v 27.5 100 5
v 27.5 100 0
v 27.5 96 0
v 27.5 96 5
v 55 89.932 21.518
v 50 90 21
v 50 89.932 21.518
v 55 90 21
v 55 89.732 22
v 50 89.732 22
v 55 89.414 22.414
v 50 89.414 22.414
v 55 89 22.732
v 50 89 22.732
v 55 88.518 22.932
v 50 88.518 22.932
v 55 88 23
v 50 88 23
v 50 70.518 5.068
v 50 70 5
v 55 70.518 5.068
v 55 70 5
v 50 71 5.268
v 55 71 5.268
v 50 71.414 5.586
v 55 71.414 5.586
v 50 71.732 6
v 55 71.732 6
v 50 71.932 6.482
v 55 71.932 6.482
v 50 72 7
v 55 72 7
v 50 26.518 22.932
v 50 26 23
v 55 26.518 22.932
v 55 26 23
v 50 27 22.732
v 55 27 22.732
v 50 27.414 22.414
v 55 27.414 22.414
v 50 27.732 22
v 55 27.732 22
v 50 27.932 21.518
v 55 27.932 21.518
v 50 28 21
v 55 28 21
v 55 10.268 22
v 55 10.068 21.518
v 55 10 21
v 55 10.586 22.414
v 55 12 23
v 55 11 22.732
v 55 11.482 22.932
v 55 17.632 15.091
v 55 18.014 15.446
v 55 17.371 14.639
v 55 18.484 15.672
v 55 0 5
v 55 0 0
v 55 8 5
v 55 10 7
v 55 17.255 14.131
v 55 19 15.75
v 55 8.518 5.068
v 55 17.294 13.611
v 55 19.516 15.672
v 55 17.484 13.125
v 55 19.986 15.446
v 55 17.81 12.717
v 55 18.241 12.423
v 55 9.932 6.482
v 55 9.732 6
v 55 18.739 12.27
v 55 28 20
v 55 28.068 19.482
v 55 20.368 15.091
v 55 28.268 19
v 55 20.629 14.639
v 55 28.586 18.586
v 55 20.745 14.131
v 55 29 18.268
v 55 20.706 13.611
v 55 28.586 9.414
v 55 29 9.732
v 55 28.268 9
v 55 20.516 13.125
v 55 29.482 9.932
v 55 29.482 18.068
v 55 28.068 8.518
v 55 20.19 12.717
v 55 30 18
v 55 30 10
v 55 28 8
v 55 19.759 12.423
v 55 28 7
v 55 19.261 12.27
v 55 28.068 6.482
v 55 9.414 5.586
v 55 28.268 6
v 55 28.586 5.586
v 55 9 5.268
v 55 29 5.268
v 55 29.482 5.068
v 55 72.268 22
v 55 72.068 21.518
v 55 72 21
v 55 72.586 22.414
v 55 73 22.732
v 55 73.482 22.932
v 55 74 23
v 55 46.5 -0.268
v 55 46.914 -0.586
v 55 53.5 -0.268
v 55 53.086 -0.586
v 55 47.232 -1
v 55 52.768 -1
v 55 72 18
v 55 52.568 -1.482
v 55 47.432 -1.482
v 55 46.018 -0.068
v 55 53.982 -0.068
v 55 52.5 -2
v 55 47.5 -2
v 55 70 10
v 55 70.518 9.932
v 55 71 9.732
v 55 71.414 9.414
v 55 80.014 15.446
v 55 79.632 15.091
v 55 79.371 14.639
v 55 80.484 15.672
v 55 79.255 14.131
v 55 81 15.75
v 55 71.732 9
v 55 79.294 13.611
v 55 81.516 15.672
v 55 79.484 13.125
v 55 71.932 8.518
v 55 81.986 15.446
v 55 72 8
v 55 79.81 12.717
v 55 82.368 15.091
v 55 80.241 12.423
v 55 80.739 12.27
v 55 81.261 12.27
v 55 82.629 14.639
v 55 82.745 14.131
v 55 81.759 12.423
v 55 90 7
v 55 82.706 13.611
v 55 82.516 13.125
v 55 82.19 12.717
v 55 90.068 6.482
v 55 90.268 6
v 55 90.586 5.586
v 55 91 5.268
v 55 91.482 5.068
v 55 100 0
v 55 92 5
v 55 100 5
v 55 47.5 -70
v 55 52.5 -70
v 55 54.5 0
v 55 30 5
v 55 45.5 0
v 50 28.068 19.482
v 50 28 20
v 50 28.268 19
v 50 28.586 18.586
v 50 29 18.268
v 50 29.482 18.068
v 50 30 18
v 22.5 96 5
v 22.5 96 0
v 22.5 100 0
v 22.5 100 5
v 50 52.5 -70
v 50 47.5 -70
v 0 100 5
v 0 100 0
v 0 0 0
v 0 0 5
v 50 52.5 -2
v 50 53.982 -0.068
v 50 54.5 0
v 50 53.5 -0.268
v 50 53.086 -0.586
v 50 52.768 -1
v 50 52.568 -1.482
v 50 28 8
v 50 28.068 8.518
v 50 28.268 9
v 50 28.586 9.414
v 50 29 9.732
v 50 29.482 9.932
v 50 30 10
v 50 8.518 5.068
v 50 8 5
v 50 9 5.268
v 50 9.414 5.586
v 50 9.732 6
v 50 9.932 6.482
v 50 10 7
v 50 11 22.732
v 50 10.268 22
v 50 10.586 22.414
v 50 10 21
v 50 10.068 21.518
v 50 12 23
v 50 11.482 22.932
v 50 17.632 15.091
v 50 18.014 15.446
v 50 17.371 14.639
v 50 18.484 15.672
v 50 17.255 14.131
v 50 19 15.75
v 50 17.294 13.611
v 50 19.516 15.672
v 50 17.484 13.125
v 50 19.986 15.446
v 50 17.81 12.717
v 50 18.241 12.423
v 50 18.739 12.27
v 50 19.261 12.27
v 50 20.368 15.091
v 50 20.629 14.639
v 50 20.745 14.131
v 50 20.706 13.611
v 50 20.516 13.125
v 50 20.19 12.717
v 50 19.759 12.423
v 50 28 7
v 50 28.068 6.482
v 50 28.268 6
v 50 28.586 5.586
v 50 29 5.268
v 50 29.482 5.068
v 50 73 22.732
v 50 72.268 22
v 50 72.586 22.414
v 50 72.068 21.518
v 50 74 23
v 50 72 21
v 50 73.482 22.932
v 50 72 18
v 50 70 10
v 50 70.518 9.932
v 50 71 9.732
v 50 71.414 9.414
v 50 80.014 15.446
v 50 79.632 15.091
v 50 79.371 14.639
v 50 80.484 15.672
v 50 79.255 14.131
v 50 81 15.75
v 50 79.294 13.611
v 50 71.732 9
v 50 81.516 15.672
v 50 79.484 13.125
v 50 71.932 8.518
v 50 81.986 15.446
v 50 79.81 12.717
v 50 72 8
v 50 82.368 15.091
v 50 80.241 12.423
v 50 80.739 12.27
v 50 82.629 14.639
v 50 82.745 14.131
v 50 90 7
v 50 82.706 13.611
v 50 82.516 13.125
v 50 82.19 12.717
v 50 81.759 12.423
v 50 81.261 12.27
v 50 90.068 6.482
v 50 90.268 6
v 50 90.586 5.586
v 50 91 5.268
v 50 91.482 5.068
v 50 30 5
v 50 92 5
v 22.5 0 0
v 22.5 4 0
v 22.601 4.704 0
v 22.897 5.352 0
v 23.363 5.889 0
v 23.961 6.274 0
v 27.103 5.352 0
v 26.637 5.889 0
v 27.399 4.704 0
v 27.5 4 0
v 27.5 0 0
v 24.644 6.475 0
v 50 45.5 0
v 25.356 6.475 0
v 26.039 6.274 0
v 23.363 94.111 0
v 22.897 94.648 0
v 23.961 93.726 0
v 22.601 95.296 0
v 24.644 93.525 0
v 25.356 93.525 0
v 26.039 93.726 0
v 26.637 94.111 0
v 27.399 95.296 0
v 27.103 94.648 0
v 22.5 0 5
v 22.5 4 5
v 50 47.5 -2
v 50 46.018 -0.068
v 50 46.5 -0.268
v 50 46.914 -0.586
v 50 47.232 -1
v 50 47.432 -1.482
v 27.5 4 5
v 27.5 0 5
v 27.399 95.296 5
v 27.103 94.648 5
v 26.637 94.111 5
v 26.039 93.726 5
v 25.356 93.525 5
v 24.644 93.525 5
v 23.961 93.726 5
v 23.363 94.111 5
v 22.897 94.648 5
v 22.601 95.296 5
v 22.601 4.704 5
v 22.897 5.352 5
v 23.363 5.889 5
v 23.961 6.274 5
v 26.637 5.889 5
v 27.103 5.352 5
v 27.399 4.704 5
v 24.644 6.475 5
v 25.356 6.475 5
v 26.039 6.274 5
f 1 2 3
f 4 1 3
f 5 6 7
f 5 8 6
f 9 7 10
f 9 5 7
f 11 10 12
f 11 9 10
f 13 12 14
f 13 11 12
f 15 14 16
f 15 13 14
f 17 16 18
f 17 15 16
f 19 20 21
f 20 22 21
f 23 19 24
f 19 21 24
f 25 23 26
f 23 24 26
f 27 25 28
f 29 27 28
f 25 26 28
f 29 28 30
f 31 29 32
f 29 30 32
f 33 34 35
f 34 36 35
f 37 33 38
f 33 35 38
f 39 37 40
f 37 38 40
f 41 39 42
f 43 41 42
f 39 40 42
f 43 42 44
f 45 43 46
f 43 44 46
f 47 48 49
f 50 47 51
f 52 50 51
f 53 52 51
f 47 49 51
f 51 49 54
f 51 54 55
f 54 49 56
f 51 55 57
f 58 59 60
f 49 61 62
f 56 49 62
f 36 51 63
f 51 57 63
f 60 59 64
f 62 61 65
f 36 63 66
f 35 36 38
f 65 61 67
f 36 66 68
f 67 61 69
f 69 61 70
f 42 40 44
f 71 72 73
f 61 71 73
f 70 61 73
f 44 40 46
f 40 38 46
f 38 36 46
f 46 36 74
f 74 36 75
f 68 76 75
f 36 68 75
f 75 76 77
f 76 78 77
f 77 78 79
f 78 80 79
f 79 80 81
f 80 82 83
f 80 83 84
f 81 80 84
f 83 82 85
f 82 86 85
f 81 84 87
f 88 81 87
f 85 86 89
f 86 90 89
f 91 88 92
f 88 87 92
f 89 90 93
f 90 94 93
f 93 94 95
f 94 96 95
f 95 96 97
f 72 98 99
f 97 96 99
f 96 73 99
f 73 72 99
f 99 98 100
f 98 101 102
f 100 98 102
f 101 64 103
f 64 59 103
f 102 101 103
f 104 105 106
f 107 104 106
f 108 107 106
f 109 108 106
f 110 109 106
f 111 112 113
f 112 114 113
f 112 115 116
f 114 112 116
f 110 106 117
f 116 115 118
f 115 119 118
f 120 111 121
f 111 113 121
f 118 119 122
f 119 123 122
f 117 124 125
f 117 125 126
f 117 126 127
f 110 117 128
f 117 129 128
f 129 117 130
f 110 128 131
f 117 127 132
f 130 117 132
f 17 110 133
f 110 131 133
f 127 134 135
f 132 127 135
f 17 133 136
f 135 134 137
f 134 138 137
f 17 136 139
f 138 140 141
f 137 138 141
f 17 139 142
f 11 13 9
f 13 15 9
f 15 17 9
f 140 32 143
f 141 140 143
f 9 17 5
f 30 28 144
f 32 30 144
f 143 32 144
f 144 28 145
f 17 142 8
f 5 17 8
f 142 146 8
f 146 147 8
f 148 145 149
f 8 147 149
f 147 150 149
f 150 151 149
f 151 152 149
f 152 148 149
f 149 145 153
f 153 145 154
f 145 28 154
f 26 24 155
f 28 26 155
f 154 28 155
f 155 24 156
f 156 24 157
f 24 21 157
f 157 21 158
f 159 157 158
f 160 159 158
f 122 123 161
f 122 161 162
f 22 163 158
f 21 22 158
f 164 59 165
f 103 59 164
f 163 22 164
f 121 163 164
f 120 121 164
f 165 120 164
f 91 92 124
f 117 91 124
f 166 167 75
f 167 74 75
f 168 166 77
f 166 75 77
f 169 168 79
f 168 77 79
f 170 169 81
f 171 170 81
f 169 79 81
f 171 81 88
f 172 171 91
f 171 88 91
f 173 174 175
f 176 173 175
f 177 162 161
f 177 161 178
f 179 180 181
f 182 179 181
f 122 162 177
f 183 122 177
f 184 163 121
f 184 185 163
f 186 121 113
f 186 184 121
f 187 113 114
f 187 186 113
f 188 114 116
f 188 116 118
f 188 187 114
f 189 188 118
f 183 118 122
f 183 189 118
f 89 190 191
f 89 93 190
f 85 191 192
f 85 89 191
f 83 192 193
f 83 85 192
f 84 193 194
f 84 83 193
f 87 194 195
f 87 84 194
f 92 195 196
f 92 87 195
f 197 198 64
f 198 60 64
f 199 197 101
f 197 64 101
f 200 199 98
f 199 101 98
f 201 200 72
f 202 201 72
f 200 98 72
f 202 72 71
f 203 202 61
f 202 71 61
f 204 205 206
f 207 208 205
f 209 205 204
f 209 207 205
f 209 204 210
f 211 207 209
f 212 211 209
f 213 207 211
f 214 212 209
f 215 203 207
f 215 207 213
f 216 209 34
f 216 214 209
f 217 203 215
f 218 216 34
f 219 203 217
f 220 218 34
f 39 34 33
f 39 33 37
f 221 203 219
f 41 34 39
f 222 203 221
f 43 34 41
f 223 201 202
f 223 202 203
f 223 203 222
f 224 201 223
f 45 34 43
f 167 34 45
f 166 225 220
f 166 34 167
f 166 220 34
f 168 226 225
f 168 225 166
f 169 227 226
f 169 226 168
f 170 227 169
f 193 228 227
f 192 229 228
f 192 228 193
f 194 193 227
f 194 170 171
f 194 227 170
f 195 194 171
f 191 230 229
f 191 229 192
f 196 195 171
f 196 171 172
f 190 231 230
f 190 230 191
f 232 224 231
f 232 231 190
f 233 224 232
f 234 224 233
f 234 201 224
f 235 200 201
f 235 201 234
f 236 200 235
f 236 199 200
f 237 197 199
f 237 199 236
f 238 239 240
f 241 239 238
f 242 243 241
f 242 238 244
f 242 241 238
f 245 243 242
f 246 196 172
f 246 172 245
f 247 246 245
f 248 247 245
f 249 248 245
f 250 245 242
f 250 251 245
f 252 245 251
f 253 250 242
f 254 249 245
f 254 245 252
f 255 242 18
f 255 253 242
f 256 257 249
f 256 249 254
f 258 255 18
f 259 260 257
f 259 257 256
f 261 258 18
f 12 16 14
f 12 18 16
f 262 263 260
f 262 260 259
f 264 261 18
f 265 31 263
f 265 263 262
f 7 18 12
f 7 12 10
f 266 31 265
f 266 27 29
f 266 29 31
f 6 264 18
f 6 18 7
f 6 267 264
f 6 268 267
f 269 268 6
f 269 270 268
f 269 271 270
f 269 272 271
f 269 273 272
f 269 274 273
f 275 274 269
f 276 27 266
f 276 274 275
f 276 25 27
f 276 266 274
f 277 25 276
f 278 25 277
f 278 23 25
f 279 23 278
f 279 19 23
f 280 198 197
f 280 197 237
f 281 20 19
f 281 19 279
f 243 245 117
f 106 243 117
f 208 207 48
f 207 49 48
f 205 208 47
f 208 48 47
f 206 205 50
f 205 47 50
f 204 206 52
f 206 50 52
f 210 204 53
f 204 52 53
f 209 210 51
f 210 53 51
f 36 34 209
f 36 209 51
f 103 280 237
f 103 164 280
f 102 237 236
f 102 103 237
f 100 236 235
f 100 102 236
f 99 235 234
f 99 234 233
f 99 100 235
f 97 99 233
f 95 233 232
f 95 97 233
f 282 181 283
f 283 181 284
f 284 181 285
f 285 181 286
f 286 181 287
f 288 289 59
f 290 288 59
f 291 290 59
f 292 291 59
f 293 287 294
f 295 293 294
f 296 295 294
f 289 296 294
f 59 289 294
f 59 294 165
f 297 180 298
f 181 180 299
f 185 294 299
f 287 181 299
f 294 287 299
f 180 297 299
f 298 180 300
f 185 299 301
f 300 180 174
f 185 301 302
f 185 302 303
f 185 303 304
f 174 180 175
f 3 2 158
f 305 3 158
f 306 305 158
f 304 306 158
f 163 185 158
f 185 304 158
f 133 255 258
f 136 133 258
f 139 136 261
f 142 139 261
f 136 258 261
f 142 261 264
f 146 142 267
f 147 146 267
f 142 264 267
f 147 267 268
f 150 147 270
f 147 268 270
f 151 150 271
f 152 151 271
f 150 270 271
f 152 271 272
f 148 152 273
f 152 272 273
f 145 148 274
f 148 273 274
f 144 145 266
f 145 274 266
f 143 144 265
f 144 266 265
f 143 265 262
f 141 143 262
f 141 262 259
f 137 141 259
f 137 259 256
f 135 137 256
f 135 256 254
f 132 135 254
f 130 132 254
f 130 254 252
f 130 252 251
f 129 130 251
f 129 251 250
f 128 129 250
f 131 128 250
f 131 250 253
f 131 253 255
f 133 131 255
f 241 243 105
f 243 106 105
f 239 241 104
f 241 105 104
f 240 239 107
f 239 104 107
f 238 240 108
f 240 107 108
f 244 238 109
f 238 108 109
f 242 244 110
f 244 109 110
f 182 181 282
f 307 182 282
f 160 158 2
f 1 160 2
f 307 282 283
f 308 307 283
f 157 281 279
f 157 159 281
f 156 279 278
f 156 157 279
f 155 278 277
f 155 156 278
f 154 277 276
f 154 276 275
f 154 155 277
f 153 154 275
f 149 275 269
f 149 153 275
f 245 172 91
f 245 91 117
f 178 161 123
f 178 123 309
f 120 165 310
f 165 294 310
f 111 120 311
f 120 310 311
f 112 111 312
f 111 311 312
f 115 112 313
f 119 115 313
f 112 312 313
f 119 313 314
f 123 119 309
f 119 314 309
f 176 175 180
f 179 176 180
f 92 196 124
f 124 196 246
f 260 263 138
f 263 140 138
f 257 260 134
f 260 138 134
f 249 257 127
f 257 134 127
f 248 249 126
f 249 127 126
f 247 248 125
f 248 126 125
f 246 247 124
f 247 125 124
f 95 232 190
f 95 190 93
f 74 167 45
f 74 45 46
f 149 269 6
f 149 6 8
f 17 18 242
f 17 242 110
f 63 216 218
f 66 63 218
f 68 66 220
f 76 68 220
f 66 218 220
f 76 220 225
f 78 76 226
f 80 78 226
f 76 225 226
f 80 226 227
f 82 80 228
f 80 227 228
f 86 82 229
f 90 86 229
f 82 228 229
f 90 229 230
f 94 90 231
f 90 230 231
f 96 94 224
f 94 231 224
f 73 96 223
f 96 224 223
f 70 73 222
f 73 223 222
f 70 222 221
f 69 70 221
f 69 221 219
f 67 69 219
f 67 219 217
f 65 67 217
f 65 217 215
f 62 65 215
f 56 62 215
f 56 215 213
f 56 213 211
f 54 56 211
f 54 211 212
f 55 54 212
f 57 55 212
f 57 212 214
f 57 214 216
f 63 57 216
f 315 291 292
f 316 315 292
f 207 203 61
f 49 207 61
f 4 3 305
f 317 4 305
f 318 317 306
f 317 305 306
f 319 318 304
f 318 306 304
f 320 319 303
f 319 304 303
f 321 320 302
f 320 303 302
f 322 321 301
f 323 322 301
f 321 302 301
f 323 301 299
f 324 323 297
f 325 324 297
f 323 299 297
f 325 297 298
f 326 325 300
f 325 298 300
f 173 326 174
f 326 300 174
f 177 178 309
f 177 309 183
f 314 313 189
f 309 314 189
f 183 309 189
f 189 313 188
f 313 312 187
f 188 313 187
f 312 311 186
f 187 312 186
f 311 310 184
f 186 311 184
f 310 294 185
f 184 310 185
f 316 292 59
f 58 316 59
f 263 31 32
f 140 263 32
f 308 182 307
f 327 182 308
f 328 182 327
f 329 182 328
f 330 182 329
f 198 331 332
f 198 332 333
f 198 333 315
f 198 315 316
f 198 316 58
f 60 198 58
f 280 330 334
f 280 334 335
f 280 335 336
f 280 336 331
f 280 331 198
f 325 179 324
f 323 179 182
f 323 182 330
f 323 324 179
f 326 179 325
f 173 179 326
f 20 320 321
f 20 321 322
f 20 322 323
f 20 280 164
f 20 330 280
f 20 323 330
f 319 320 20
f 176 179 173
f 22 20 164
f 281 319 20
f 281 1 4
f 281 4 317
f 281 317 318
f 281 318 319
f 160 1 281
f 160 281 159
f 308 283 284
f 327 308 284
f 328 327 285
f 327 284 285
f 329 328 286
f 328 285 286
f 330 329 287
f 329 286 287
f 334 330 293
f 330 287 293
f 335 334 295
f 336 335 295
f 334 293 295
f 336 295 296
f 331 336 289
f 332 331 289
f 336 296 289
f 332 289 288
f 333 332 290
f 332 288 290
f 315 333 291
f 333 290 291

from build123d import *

# Parameters (mm, degrees)
BOSS_EXTRUDE3_DEPTH = 5
SKETCH4_W           = 5
SKETCH4_H           = 5
BOSS_EXTRUDE4_DEPTH = 70
SKETCH5_W           = 5
SKETCH5_H           = 18
BOSS_EXTRUDE5_DEPTH = 18
SKETCH6_R           = 1.75
CUT_EXTRUDE1_DEPTH  = 6
SKETCH7_W           = 8
SKETCH7_H           = 44
BOSS_EXTRUDE6_DEPTH = 5
FILLET1_R           = 2


with BuildPart() as part:
    # Sketch3 → Boss-Extrude3 (new body)
    with BuildSketch(Plane.XY):
        with BuildLine():
            Line((22.5, 100), (0, 100))
            Line((0, 100), (0, 0))
            Line((0, 0), (22.5, 0))
            Line((22.5, 0), (22.5, 4))
            ThreePointArc((22.5, 4), (25, 6.5), (27.5, 4))
            Line((27.5, 4), (27.5, 0))
            Line((27.5, 0), (55, 0))
            Line((55, 0), (55, 100))
            Line((55, 100), (27.5, 100))
            Line((27.5, 100), (27.5, 96))
            ThreePointArc((27.5, 96), (25, 93.5), (22.5, 96))
            Line((22.5, 96), (22.5, 100))
        make_face()
    extrude(amount=BOSS_EXTRUDE3_DEPTH)

    # Sketch4 → Boss-Extrude4 (add)
    with BuildSketch(Plane(origin=(0, 0, 0), x_dir=(-1, 0, 0), z_dir=(0, 0, -1))):
        with Locations((-52.5, 50)):
            Rectangle(SKETCH4_W, SKETCH4_H)
    extrude(amount=BOSS_EXTRUDE4_DEPTH)

    # Sketch5 → Boss-Extrude5 (add)
    with BuildSketch(Plane.XY.offset(5)):
        with Locations((52.5, 19)):
            Rectangle(SKETCH5_W, SKETCH5_H)
        with Locations((52.5, 81)):
            Rectangle(SKETCH5_W, SKETCH5_H)
    extrude(amount=BOSS_EXTRUDE5_DEPTH)

    # Sketch6 → Cut-Extrude1 (cut, through all)
    with BuildSketch(Plane.ZY.offset(-50)):
        with Locations((14, 19)):
            Circle(SKETCH6_R)
        with Locations((14, 81)):
            Circle(SKETCH6_R)
    extrude(amount=-CUT_EXTRUDE1_DEPTH, mode=Mode.SUBTRACT)

    # Sketch7 → Boss-Extrude6 (add)
    with BuildSketch(Plane.ZY.offset(-50)):
        with Locations((14, 50)):
            Rectangle(SKETCH7_W, SKETCH7_H)
    extrude(amount=-BOSS_EXTRUDE6_DEPTH)

    # Fillet1
    fillet1_edges = [part.edges().sort_by_distance(p)[0] for p in [
        (52.5, 47.5, 0),
        (52.5, 52.5, 0),
        (52.5, 10, 5),
        (52.5, 28, 5),
        (52.5, 10, 23),
        (52.5, 28, 23),
        (52.5, 72, 5),
        (52.5, 90, 5),
        (52.5, 72, 23),
        (52.5, 90, 23),
        (52.5, 72, 10),
        (52.5, 28, 10),
        (52.5, 28, 18),
    ]]
    fillet(fillet1_edges, radius=FILLET1_R)


solid = part.part
